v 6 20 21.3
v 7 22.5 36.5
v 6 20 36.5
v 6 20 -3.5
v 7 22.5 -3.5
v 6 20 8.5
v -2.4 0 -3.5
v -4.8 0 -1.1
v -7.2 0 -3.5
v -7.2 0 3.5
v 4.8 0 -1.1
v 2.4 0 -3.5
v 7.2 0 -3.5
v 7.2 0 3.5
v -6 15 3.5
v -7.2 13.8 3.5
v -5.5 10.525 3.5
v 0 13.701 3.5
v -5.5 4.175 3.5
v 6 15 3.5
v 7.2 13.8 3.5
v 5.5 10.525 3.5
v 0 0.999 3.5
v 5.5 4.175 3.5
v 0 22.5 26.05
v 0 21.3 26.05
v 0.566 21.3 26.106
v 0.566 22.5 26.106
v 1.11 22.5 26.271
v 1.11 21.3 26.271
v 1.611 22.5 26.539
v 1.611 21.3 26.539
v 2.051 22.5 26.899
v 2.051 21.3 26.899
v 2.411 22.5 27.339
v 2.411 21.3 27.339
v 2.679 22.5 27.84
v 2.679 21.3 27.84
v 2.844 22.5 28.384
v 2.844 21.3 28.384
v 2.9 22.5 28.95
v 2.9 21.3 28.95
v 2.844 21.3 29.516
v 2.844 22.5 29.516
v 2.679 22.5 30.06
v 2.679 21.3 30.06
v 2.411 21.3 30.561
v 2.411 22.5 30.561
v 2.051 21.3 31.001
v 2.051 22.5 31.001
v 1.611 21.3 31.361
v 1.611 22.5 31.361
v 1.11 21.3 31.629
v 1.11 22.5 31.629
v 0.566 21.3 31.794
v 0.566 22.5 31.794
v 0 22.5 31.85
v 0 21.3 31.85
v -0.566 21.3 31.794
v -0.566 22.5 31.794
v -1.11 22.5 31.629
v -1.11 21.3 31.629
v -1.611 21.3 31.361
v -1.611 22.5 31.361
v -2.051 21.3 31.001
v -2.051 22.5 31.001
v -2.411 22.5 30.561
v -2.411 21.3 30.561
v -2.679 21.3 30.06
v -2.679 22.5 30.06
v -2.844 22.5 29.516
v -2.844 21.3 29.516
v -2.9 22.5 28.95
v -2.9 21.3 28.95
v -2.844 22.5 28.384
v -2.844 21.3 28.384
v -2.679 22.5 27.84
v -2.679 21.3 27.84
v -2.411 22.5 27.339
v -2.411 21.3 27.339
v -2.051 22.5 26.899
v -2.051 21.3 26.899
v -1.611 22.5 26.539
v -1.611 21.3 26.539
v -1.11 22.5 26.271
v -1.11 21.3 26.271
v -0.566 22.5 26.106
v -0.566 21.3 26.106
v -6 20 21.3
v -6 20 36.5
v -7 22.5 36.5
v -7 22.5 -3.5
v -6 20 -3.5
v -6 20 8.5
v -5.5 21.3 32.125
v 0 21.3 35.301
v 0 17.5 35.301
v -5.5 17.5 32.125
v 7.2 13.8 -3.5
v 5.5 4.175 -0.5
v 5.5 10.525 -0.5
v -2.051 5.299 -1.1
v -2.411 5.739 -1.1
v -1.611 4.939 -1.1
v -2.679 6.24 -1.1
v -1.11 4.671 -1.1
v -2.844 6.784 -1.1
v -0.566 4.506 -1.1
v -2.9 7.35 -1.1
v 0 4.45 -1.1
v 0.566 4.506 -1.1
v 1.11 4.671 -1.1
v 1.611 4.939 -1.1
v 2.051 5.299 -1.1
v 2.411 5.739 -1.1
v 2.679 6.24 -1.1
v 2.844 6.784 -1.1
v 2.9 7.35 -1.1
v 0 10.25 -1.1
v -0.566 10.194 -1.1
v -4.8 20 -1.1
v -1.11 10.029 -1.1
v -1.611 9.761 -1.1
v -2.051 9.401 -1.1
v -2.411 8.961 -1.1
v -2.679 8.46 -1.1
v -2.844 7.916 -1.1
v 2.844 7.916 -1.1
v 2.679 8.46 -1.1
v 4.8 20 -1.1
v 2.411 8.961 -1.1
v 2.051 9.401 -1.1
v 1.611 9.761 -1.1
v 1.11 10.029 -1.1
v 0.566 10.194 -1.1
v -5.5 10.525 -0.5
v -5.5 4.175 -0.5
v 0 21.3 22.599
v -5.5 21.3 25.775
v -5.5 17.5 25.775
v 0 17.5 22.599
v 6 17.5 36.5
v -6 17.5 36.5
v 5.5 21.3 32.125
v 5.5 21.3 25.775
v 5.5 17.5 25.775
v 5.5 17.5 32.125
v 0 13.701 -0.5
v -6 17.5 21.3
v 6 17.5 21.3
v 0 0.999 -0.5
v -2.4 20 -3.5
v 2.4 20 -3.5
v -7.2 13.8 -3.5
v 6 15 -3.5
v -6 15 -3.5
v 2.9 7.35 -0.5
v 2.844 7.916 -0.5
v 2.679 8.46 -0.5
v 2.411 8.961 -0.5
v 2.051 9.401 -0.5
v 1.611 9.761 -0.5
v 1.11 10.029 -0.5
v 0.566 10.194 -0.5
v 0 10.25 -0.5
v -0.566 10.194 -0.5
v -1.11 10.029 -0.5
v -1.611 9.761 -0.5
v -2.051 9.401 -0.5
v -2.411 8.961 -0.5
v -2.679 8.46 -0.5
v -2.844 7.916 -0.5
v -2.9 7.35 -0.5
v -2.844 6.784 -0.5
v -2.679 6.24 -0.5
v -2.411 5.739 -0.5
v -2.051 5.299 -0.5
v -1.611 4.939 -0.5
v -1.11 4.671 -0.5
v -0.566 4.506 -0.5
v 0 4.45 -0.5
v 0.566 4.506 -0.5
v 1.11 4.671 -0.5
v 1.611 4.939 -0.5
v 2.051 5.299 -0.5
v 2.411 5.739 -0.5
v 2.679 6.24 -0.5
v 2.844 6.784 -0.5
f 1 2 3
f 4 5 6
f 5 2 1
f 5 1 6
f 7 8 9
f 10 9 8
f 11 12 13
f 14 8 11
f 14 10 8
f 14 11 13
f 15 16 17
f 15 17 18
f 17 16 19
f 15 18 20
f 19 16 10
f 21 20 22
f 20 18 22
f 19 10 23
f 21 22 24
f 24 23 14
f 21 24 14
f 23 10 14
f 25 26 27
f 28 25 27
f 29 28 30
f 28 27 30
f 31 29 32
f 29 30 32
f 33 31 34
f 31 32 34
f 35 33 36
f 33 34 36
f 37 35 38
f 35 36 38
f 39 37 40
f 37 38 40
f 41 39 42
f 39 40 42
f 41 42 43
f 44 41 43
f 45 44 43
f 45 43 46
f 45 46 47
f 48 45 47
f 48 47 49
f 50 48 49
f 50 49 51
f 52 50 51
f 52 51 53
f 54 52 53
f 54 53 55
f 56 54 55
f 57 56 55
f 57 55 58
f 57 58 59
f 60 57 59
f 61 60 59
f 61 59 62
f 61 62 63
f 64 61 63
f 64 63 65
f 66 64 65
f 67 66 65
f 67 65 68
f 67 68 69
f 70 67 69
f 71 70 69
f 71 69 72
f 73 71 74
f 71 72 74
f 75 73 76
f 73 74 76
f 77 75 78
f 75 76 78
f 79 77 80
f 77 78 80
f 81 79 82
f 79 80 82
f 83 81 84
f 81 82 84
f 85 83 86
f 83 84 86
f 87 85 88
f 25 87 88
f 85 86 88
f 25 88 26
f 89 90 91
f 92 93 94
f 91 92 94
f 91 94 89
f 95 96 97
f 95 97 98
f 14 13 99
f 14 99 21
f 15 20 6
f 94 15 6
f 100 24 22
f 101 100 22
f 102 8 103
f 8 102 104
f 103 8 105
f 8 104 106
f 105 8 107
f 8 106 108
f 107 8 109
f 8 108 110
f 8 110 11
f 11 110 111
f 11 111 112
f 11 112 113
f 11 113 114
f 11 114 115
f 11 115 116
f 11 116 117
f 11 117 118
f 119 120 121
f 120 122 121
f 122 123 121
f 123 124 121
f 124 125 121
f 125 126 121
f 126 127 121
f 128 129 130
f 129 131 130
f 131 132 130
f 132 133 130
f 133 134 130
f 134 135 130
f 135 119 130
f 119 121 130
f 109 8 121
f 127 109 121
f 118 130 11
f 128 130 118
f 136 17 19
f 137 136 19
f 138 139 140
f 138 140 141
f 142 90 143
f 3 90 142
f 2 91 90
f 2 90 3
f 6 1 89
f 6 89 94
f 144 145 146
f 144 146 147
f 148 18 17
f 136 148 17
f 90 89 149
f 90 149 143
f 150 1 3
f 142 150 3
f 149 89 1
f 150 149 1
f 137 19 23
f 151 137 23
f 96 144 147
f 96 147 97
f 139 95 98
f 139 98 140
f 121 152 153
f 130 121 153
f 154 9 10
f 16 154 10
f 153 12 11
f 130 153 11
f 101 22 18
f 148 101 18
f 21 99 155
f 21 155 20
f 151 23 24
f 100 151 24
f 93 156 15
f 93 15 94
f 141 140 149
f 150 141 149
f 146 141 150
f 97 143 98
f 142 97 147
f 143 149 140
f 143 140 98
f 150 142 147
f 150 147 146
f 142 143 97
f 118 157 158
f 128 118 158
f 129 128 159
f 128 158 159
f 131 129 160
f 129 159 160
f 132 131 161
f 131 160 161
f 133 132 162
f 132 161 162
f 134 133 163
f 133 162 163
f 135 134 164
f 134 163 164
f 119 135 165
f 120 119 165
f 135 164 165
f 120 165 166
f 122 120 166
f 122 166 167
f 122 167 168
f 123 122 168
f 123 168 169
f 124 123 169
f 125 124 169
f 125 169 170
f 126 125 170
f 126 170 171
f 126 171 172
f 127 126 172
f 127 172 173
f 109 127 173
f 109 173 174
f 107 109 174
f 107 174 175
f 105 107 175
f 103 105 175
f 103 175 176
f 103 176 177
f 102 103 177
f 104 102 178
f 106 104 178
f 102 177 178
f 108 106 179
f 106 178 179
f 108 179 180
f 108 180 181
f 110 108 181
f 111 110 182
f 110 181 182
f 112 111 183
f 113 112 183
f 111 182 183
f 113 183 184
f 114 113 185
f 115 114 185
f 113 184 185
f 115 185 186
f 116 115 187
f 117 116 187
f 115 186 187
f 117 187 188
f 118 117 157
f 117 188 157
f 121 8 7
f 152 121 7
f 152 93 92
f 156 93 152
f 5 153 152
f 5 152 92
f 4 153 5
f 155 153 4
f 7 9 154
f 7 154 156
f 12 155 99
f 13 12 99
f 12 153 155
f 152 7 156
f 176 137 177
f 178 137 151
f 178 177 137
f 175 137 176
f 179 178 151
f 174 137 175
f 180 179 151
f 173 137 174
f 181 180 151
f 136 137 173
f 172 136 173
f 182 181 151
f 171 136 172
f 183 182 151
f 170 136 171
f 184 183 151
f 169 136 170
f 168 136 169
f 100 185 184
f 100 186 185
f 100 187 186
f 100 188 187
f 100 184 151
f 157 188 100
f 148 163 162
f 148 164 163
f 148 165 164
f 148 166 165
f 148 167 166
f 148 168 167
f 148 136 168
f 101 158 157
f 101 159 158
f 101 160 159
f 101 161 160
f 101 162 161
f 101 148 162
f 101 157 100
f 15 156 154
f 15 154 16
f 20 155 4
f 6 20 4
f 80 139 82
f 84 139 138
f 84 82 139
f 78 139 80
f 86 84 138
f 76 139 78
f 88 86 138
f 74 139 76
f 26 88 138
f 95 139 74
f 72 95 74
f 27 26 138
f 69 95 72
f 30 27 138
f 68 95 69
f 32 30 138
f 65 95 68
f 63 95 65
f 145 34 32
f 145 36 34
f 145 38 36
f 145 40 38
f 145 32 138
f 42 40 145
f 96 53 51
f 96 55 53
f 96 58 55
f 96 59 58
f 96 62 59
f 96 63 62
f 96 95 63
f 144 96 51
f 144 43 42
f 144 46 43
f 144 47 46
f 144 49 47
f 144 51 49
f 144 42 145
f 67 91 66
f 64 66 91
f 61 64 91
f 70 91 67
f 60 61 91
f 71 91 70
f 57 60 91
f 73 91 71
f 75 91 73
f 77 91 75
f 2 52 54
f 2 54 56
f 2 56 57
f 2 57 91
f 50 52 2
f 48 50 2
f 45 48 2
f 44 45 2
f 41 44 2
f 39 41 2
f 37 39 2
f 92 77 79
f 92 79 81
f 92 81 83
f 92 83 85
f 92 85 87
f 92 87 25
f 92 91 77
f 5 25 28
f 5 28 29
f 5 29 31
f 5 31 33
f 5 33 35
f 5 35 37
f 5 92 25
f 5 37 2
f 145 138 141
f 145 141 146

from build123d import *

# Parameters (mm, degrees)
SKETCH1_W               = 12
SKETCH1_H               = 7
BOSS_EXTRUDE1_DEPTH     = 20
CUT_EXTRUDE1_DEPTH      = 20
CUT_EXTRUDE2_REACH      = 24.023
SKETCH3_R               = 2.9
CUT_EXTRUDE3_DEPTH      = 4
SKETCH5_W               = 14
SKETCH5_H               = 40
BOSS_EXTRUDE2_DEPTH     = 2.5
CUT_EXTRUDE4_REACH      = 48.425
SKETCH14_W              = 12
SKETCH14_H              = 15.2
BOSS_EXTRUDE6_DEPTH     = 2.5
CUT_EXTRUDE6_DEPTH      = 2.5
CUT_EXTRUDE6_DEPTH_BACK = 1.3
CUT_EXTRUDE7_REACH      = 44.836
SKETCH9_R               = 2.9
SKETCH10_W              = 1.2
SKETCH10_H              = 7
BOSS_EXTRUDE3_DEPTH     = 15
CHAMFER1_SIZE           = 1.2
SKETCH12_W              = 12
SKETCH12_H              = 5
BOSS_EXTRUDE5_DEPTH     = 10
CHAMFER3_SIZE           = 10


# Some blends are built 0.0001 mm under size
with BuildPart() as part:
    # Sketch1 → Boss-Extrude1 (new body)
    with BuildSketch(Plane(origin=(0, 0, 0), x_dir=(1, 0, 0), z_dir=(0, 1, 0))):
        Rectangle(SKETCH1_W, SKETCH1_H)
    extrude(amount=BOSS_EXTRUDE1_DEPTH)

    # Sketch2 → Cut-Extrude1 (cut)
    with BuildSketch(Plane(origin=(0, 20, 0), x_dir=(1, 0, 0), z_dir=(0, 1, 0))):
        Polygon((0, 3.5), (2.4, 3.5), (4.8, 1.1), (0, 1.1), (-4.8, 1.1), (-2.4, 3.5), align=None)
    extrude(amount=-CUT_EXTRUDE1_DEPTH, mode=Mode.SUBTRACT)

    # Sketch3 → Cut-Extrude2 (cut, up to next)
    with BuildSketch(Plane.XY.offset(3.5), mode=Mode.PRIVATE) as cut_extrude2_sk1:
        with Locations((0, 7.35)):
            Circle(SKETCH3_R)
    cut_extrude2_tool1 = extrude(cut_extrude2_sk1.sketch, amount=-CUT_EXTRUDE2_REACH, mode=Mode.PRIVATE) & part.part
    add(cut_extrude2_tool1.solids().sort_by_distance((0, 7.35, 3.5))[0], mode=Mode.SUBTRACT)

    # Sketch4 → Cut-Extrude3 (cut)
    with BuildSketch(Plane.XY.offset(3.5)):
        Polygon((0, 13.700852961), (-5.5, 10.525426481), (-5.5, 4.174573519), (0, 0.999147039), (5.5, 4.174573519), (5.5, 10.525426481), align=None)
    extrude(amount=-CUT_EXTRUDE3_DEPTH, mode=Mode.SUBTRACT)

    # Sketch5 → Boss-Extrude2 (add)
    with BuildSketch(Plane(origin=(0, 20, 0), x_dir=(1, 0, 0), z_dir=(0, 1, 0))):
        with Locations((0, -16.5)):
            Rectangle(SKETCH5_W, SKETCH5_H)
    extrude(amount=BOSS_EXTRUDE2_DEPTH)

    # Sketch6 → Cut-Extrude4 (cut, up to next)
    with BuildSketch(Plane(origin=(0, 0, -3.5), x_dir=(-1, 0, 0), z_dir=(0, 0, -1)), mode=Mode.PRIVATE) as cut_extrude4_sk1:
        Polygon((-7, 20), (-7, 22.5), (-6, 20), align=None)
    cut_extrude4_tool1 = extrude(cut_extrude4_sk1.sketch, amount=-CUT_EXTRUDE4_REACH, mode=Mode.PRIVATE) & part.part
    # Sketch6 → Cut-Extrude4 (cut, up to next)
    with BuildSketch(Plane(origin=(0, 0, -3.5), x_dir=(-1, 0, 0), z_dir=(0, 0, -1)), mode=Mode.PRIVATE) as cut_extrude4_sk2:
        Polygon((7, 20), (6, 20), (7, 22.5), align=None)
    cut_extrude4_tool2 = extrude(cut_extrude4_sk2.sketch, amount=-CUT_EXTRUDE4_REACH, mode=Mode.PRIVATE) & part.part
    add(cut_extrude4_tool1.solids().sort_by_distance((6.666667, 20.833333, -3.5))[0], mode=Mode.SUBTRACT)
    add(cut_extrude4_tool2.solids().sort_by_distance((-6.666667, 20.833333, -3.5))[0], mode=Mode.SUBTRACT)

    # Sketch14 → Boss-Extrude6 (add)
    with BuildSketch(Plane.XZ.offset(-20)):
        with Locations((0, 28.9)):
            Rectangle(SKETCH14_W, SKETCH14_H)
    extrude(amount=BOSS_EXTRUDE6_DEPTH)

    # Sketch8 → Cut-Extrude6 (cut, two sides: drawn at the far end of the back side and taken through both)
    with BuildSketch(Plane.XZ.offset(-20).offset(-CUT_EXTRUDE6_DEPTH_BACK)):
        Polygon((0, 22.599147039), (5.5, 25.774573519), (5.5, 32.125426481), (0, 35.300852961), (-5.5, 32.125426481), (-5.5, 25.774573519), align=None)
    extrude(amount=CUT_EXTRUDE6_DEPTH + CUT_EXTRUDE6_DEPTH_BACK, mode=Mode.SUBTRACT)

    # Sketch9 → Cut-Extrude7 (cut, up to next)
    with BuildSketch(Plane(origin=(0, 21.3, 0), x_dir=(-1, 0, 0), z_dir=(0, -1, 0)), mode=Mode.PRIVATE) as cut_extrude7_sk1:
        with Locations(Location((0, -28.95, 0), (0, 0, 90))):
            Circle(SKETCH9_R)
    cut_extrude7_tool1 = extrude(cut_extrude7_sk1.sketch, amount=-CUT_EXTRUDE7_REACH, mode=Mode.PRIVATE) & part.part
    add(cut_extrude7_tool1.solids().sort_by_distance((0, 21.3, 28.95))[0], mode=Mode.SUBTRACT)

    # Sketch10 → Boss-Extrude3 (add)
    with BuildSketch(Plane.XZ):
        with Locations((-6.6, 0)):
            Rectangle(SKETCH10_W, SKETCH10_H)
        with Locations((6.6, 0)):
            Rectangle(SKETCH10_W, SKETCH10_H)
    extrude(amount=-BOSS_EXTRUDE3_DEPTH)

    # Chamfer1
    chamfer1_edges = [part.edges().sort_by_distance(p)[0] for p in [
        (7.2, 15, 0),
        (-7.2, 15, 0),
    ]]
    chamfer(chamfer1_edges, length=CHAMFER1_SIZE - 0.0001)  # a hair under: the kernel refuses the full size

    # Sketch12 → Boss-Extrude5 (add)
    with BuildSketch(Plane.XY.offset(3.5)):
        with Locations((0, 17.5)):
            Rectangle(SKETCH12_W, SKETCH12_H)
    extrude(amount=BOSS_EXTRUDE5_DEPTH)

    # Chamfer3
    # the kernel refuses this chamfer: 10 mm, written as the material it takes off along each edge
    with BuildSketch(Plane(origin=(31.71682988, 15, 13.5), x_dir=(0, -0.027495876610586317, -0.9996219169112968), z_dir=(-1, 0, 0))) as chamfer3_piece_1_section:
        Polygon((CHAMFER3_SIZE * 0.999621916911, -CHAMFER3_SIZE * 0.0274958766106), (-CHAMFER3_SIZE * 0.0274958766106, -CHAMFER3_SIZE * 0.999621916911), (0, 0), align=None)
    chamfer3_piece_1 = extrude(amount=63.433659759, mode=Mode.PRIVATE)
    chamfer3_piece_1 = split(chamfer3_piece_1, bisect_by=Plane(origin=(4.860757505, 20, 8.732154153), z_dir=(0, -1, 0)), keep=Keep.TOP, mode=Mode.PRIVATE)
    add(chamfer3_piece_1, mode=Mode.SUBTRACT)


solid = part.part
